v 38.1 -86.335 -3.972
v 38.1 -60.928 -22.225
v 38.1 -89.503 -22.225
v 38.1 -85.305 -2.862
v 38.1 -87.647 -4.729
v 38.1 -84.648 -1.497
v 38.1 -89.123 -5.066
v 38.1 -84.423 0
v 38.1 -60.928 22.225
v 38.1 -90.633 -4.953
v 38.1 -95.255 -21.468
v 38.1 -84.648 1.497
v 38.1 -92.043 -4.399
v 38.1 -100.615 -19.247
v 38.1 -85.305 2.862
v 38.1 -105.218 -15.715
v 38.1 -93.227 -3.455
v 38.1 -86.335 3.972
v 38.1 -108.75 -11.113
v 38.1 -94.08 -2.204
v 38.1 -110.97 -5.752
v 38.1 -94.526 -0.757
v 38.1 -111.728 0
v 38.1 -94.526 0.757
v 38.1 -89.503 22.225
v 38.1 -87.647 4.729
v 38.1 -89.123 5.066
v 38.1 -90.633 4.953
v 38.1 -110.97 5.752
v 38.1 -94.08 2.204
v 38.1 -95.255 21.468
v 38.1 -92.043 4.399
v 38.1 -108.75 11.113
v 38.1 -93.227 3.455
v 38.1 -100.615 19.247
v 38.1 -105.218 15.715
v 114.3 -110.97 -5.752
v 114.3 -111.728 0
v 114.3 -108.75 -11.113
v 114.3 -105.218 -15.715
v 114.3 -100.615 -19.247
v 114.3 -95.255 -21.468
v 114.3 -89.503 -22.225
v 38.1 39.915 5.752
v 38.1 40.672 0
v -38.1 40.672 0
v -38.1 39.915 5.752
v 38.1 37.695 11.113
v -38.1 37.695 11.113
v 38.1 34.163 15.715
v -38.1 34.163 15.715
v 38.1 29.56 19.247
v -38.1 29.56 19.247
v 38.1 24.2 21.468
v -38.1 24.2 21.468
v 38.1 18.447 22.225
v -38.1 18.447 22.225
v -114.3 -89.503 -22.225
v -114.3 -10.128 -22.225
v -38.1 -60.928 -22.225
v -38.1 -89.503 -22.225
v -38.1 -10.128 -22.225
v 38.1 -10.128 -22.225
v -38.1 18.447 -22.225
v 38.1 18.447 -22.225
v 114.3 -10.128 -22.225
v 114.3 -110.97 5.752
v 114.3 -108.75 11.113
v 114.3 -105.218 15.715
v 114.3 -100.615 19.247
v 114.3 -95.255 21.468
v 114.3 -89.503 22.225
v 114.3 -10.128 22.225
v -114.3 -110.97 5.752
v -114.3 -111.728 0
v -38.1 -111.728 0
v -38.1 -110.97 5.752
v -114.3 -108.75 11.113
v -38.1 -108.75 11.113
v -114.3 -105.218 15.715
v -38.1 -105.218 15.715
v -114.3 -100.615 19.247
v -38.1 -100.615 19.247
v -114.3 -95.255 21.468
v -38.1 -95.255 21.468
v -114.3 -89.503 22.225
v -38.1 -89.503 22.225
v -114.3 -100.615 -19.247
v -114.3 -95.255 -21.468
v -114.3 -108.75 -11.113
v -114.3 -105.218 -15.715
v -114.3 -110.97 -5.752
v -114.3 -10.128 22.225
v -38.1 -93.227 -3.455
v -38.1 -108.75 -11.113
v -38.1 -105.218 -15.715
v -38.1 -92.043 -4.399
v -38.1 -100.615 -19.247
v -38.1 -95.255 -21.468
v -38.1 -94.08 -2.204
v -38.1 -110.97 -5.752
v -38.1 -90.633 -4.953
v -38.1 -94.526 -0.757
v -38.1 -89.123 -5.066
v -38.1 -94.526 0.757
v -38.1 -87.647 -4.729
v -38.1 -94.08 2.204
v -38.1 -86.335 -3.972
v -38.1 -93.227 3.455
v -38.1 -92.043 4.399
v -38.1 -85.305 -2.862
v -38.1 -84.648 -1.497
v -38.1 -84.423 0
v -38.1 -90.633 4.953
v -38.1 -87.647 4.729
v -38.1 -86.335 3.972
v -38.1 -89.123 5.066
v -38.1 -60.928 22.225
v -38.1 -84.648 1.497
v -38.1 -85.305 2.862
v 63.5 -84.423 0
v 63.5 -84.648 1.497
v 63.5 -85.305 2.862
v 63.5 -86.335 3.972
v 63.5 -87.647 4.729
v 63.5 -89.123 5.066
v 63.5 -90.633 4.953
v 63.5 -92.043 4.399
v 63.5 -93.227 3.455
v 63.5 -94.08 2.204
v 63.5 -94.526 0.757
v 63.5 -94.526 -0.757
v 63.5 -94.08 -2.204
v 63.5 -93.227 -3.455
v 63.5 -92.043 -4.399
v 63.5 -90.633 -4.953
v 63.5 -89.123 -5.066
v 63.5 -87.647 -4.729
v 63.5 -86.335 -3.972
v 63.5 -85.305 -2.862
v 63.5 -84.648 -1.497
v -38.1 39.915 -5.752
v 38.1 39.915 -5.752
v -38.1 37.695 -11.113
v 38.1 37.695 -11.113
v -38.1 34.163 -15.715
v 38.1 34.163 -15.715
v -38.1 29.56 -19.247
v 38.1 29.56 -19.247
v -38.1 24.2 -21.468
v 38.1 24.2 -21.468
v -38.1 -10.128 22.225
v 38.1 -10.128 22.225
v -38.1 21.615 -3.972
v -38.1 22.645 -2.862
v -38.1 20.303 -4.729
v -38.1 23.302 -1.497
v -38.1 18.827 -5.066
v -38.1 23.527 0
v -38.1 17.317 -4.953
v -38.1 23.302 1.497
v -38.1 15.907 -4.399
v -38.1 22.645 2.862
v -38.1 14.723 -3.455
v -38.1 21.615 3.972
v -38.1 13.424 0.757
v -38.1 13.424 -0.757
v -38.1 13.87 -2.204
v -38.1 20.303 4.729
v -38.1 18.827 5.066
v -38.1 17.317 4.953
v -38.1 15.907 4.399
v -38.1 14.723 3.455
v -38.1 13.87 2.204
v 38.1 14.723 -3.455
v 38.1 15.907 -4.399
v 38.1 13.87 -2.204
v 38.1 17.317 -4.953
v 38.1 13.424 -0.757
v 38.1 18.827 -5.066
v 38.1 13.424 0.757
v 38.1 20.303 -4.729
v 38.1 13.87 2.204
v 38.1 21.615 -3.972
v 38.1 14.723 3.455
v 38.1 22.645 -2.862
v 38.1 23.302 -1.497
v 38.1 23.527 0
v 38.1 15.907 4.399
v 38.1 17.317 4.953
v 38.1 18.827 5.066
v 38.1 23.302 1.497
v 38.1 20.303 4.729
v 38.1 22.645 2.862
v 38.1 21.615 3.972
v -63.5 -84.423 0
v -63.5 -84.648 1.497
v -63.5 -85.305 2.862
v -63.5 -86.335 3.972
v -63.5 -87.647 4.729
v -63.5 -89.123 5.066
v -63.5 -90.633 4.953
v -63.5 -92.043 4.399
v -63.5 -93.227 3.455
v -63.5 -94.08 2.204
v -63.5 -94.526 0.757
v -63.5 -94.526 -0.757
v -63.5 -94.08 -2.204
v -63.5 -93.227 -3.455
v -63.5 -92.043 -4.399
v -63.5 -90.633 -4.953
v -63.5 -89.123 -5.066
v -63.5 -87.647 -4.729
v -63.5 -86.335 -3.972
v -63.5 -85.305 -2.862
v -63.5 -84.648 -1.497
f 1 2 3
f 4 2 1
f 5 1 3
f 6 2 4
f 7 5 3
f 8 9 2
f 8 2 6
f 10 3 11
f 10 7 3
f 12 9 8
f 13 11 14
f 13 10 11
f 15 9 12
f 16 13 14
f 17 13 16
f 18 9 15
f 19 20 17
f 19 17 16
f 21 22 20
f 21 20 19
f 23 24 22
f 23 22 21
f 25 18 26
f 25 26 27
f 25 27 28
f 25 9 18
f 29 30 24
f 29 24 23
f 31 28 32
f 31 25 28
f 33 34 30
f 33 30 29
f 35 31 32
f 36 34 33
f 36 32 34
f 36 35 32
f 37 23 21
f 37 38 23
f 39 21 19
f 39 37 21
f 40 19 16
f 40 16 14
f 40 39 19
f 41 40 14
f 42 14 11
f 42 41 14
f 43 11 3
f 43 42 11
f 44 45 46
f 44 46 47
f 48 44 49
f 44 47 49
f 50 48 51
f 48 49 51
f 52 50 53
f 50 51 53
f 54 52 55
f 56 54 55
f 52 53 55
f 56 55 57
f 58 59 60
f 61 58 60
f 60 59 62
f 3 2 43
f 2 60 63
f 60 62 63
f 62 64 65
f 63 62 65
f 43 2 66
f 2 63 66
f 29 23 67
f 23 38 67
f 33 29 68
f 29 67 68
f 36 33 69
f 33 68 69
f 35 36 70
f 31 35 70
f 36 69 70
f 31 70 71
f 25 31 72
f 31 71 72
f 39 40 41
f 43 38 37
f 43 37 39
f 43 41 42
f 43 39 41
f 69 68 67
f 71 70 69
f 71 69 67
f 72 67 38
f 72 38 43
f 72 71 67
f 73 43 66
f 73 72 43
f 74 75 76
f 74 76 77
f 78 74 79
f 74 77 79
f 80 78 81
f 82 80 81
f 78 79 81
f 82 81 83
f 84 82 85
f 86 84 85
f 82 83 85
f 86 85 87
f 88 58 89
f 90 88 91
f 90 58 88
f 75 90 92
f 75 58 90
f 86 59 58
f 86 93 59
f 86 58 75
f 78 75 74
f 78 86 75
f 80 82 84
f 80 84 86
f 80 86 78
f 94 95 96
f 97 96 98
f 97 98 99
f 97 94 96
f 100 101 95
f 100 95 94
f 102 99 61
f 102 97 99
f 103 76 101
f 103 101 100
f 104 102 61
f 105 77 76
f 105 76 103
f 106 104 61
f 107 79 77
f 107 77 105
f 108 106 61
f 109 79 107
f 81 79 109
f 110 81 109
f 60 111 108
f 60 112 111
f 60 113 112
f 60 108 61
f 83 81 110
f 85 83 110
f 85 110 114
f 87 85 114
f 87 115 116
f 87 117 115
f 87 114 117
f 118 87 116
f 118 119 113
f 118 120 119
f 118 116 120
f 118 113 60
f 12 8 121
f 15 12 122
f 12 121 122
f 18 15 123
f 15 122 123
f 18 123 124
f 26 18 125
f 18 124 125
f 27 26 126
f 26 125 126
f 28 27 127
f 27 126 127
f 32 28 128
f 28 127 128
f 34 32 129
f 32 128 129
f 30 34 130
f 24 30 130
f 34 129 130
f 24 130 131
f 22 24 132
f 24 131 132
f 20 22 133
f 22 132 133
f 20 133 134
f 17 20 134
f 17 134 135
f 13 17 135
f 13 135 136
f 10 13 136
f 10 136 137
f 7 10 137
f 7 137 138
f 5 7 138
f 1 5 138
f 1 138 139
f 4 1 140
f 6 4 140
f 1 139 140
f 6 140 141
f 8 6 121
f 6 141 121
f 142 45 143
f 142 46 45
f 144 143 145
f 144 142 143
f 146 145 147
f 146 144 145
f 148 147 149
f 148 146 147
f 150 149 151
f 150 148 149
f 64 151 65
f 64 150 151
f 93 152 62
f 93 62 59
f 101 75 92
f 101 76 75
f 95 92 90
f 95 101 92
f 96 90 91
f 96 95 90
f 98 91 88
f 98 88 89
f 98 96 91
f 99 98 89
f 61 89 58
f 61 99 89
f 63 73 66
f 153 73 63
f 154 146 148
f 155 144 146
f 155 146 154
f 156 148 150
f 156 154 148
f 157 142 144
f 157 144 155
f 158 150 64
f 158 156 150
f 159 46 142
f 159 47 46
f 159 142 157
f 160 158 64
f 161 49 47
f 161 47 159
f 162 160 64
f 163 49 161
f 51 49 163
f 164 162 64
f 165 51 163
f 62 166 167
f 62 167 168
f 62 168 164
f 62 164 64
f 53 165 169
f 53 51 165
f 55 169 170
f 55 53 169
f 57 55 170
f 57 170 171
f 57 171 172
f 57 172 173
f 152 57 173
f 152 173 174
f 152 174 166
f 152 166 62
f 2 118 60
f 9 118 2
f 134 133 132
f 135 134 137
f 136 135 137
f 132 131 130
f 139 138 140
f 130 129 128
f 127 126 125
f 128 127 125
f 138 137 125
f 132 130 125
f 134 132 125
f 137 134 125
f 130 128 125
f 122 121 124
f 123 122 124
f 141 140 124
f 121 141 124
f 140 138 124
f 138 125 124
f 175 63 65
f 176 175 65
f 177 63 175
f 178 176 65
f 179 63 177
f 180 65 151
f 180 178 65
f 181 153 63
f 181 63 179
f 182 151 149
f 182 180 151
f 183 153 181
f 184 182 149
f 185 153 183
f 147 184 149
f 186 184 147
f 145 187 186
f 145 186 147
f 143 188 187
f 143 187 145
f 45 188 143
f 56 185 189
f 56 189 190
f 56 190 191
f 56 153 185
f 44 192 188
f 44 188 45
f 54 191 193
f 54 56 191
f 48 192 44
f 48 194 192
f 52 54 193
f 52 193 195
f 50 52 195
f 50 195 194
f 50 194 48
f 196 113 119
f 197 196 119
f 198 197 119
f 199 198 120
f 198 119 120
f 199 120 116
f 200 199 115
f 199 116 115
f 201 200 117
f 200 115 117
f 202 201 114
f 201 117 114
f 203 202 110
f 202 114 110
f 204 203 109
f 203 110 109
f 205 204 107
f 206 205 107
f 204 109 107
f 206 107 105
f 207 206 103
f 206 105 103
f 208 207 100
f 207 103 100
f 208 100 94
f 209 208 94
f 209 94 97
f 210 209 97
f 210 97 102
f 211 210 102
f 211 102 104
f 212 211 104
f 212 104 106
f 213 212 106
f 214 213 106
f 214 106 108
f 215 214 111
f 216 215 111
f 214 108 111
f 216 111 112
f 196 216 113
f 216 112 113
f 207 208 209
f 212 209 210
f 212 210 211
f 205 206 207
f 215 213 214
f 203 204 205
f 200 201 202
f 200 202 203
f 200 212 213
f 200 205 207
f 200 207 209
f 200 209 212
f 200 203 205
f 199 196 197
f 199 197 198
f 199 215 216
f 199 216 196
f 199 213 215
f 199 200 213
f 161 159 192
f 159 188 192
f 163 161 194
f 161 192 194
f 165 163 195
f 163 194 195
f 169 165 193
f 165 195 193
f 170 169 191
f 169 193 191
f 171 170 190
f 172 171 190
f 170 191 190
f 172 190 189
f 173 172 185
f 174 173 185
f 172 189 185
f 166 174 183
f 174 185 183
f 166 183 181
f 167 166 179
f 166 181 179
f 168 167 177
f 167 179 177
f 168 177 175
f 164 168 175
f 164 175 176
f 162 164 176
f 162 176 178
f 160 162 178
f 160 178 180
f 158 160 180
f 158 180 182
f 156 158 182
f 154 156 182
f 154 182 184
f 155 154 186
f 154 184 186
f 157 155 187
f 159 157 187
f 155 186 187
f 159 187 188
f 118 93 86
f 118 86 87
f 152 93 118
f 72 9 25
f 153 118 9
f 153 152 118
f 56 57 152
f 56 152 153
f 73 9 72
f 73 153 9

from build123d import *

# Parameters (mm, degrees)
F1_DEPTH = 22.225
F2_R     = 22.22499
F3_R     = 5.08
F4_DEPTH = 114.301
F5_DEPTH = 114.301
F6_R     = 5.08
F7_DEPTH = 63.5


# Not quite as in the source:
# - a fillet or chamfer is up to 0.001 mm smaller than in the source, because OpenCascade refuses the exact size


with BuildPart() as f1:
    # F0 (on Top) → F1 (new body, symmetric)
    with BuildSketch(Plane.XY):
        Polygon((38.1, 40.6722736142), (0, 40.6722736142), (-38.1, 40.6722736142), (-38.1, -10.1277263858), (-114.3, -10.1277263858), (-114.3, -111.7277263858), (-38.1, -111.7277263858), (-38.1, -60.9277263858), (38.1, -60.9277263858), (38.1, -111.7277263858), (114.3, -111.7277263858), (114.3, -10.1277263858), (38.1, -10.1277263858), align=None)
    extrude(amount=F1_DEPTH, both=True)

    # F2 (radius 22.225 in the source; OpenCascade refuses exactly that, so slightly less here)
    f2_edges = [f1.edges().sort_by_distance(p)[0] for p in [
        (-76.2, -111.727726, 22.225),
        (-76.2, -111.727726, -22.225),
        (76.2, -111.727726, 22.225),
        (76.2, -111.727726, -22.225),
        (0, 40.672274, 22.225),
        (0, 40.672274, -22.225),
    ]]
    fillet(f2_edges, radius=F2_R)

    # F3 (on Right) → F4 (cut, through all)
    with BuildSketch(Plane.YZ):
        with Locations((18.4472736142, 0)):
            Circle(F3_R)
    extrude(amount=-F4_DEPTH, mode=Mode.SUBTRACT)

    # F3 (on Right) → F5 (cut, through all)
    with BuildSketch(Plane.YZ):
        with Locations((18.4472736142, 0)):
            Circle(F3_R)
    extrude(amount=F5_DEPTH, mode=Mode.SUBTRACT)

    # F6 (on Right) → F7 (cut, symmetric)
    with BuildSketch(Plane.YZ):
        with Locations((-89.5027263858, 0)):
            Circle(F6_R)
    extrude(amount=F7_DEPTH, both=True, mode=Mode.SUBTRACT)


solid = f1.part
